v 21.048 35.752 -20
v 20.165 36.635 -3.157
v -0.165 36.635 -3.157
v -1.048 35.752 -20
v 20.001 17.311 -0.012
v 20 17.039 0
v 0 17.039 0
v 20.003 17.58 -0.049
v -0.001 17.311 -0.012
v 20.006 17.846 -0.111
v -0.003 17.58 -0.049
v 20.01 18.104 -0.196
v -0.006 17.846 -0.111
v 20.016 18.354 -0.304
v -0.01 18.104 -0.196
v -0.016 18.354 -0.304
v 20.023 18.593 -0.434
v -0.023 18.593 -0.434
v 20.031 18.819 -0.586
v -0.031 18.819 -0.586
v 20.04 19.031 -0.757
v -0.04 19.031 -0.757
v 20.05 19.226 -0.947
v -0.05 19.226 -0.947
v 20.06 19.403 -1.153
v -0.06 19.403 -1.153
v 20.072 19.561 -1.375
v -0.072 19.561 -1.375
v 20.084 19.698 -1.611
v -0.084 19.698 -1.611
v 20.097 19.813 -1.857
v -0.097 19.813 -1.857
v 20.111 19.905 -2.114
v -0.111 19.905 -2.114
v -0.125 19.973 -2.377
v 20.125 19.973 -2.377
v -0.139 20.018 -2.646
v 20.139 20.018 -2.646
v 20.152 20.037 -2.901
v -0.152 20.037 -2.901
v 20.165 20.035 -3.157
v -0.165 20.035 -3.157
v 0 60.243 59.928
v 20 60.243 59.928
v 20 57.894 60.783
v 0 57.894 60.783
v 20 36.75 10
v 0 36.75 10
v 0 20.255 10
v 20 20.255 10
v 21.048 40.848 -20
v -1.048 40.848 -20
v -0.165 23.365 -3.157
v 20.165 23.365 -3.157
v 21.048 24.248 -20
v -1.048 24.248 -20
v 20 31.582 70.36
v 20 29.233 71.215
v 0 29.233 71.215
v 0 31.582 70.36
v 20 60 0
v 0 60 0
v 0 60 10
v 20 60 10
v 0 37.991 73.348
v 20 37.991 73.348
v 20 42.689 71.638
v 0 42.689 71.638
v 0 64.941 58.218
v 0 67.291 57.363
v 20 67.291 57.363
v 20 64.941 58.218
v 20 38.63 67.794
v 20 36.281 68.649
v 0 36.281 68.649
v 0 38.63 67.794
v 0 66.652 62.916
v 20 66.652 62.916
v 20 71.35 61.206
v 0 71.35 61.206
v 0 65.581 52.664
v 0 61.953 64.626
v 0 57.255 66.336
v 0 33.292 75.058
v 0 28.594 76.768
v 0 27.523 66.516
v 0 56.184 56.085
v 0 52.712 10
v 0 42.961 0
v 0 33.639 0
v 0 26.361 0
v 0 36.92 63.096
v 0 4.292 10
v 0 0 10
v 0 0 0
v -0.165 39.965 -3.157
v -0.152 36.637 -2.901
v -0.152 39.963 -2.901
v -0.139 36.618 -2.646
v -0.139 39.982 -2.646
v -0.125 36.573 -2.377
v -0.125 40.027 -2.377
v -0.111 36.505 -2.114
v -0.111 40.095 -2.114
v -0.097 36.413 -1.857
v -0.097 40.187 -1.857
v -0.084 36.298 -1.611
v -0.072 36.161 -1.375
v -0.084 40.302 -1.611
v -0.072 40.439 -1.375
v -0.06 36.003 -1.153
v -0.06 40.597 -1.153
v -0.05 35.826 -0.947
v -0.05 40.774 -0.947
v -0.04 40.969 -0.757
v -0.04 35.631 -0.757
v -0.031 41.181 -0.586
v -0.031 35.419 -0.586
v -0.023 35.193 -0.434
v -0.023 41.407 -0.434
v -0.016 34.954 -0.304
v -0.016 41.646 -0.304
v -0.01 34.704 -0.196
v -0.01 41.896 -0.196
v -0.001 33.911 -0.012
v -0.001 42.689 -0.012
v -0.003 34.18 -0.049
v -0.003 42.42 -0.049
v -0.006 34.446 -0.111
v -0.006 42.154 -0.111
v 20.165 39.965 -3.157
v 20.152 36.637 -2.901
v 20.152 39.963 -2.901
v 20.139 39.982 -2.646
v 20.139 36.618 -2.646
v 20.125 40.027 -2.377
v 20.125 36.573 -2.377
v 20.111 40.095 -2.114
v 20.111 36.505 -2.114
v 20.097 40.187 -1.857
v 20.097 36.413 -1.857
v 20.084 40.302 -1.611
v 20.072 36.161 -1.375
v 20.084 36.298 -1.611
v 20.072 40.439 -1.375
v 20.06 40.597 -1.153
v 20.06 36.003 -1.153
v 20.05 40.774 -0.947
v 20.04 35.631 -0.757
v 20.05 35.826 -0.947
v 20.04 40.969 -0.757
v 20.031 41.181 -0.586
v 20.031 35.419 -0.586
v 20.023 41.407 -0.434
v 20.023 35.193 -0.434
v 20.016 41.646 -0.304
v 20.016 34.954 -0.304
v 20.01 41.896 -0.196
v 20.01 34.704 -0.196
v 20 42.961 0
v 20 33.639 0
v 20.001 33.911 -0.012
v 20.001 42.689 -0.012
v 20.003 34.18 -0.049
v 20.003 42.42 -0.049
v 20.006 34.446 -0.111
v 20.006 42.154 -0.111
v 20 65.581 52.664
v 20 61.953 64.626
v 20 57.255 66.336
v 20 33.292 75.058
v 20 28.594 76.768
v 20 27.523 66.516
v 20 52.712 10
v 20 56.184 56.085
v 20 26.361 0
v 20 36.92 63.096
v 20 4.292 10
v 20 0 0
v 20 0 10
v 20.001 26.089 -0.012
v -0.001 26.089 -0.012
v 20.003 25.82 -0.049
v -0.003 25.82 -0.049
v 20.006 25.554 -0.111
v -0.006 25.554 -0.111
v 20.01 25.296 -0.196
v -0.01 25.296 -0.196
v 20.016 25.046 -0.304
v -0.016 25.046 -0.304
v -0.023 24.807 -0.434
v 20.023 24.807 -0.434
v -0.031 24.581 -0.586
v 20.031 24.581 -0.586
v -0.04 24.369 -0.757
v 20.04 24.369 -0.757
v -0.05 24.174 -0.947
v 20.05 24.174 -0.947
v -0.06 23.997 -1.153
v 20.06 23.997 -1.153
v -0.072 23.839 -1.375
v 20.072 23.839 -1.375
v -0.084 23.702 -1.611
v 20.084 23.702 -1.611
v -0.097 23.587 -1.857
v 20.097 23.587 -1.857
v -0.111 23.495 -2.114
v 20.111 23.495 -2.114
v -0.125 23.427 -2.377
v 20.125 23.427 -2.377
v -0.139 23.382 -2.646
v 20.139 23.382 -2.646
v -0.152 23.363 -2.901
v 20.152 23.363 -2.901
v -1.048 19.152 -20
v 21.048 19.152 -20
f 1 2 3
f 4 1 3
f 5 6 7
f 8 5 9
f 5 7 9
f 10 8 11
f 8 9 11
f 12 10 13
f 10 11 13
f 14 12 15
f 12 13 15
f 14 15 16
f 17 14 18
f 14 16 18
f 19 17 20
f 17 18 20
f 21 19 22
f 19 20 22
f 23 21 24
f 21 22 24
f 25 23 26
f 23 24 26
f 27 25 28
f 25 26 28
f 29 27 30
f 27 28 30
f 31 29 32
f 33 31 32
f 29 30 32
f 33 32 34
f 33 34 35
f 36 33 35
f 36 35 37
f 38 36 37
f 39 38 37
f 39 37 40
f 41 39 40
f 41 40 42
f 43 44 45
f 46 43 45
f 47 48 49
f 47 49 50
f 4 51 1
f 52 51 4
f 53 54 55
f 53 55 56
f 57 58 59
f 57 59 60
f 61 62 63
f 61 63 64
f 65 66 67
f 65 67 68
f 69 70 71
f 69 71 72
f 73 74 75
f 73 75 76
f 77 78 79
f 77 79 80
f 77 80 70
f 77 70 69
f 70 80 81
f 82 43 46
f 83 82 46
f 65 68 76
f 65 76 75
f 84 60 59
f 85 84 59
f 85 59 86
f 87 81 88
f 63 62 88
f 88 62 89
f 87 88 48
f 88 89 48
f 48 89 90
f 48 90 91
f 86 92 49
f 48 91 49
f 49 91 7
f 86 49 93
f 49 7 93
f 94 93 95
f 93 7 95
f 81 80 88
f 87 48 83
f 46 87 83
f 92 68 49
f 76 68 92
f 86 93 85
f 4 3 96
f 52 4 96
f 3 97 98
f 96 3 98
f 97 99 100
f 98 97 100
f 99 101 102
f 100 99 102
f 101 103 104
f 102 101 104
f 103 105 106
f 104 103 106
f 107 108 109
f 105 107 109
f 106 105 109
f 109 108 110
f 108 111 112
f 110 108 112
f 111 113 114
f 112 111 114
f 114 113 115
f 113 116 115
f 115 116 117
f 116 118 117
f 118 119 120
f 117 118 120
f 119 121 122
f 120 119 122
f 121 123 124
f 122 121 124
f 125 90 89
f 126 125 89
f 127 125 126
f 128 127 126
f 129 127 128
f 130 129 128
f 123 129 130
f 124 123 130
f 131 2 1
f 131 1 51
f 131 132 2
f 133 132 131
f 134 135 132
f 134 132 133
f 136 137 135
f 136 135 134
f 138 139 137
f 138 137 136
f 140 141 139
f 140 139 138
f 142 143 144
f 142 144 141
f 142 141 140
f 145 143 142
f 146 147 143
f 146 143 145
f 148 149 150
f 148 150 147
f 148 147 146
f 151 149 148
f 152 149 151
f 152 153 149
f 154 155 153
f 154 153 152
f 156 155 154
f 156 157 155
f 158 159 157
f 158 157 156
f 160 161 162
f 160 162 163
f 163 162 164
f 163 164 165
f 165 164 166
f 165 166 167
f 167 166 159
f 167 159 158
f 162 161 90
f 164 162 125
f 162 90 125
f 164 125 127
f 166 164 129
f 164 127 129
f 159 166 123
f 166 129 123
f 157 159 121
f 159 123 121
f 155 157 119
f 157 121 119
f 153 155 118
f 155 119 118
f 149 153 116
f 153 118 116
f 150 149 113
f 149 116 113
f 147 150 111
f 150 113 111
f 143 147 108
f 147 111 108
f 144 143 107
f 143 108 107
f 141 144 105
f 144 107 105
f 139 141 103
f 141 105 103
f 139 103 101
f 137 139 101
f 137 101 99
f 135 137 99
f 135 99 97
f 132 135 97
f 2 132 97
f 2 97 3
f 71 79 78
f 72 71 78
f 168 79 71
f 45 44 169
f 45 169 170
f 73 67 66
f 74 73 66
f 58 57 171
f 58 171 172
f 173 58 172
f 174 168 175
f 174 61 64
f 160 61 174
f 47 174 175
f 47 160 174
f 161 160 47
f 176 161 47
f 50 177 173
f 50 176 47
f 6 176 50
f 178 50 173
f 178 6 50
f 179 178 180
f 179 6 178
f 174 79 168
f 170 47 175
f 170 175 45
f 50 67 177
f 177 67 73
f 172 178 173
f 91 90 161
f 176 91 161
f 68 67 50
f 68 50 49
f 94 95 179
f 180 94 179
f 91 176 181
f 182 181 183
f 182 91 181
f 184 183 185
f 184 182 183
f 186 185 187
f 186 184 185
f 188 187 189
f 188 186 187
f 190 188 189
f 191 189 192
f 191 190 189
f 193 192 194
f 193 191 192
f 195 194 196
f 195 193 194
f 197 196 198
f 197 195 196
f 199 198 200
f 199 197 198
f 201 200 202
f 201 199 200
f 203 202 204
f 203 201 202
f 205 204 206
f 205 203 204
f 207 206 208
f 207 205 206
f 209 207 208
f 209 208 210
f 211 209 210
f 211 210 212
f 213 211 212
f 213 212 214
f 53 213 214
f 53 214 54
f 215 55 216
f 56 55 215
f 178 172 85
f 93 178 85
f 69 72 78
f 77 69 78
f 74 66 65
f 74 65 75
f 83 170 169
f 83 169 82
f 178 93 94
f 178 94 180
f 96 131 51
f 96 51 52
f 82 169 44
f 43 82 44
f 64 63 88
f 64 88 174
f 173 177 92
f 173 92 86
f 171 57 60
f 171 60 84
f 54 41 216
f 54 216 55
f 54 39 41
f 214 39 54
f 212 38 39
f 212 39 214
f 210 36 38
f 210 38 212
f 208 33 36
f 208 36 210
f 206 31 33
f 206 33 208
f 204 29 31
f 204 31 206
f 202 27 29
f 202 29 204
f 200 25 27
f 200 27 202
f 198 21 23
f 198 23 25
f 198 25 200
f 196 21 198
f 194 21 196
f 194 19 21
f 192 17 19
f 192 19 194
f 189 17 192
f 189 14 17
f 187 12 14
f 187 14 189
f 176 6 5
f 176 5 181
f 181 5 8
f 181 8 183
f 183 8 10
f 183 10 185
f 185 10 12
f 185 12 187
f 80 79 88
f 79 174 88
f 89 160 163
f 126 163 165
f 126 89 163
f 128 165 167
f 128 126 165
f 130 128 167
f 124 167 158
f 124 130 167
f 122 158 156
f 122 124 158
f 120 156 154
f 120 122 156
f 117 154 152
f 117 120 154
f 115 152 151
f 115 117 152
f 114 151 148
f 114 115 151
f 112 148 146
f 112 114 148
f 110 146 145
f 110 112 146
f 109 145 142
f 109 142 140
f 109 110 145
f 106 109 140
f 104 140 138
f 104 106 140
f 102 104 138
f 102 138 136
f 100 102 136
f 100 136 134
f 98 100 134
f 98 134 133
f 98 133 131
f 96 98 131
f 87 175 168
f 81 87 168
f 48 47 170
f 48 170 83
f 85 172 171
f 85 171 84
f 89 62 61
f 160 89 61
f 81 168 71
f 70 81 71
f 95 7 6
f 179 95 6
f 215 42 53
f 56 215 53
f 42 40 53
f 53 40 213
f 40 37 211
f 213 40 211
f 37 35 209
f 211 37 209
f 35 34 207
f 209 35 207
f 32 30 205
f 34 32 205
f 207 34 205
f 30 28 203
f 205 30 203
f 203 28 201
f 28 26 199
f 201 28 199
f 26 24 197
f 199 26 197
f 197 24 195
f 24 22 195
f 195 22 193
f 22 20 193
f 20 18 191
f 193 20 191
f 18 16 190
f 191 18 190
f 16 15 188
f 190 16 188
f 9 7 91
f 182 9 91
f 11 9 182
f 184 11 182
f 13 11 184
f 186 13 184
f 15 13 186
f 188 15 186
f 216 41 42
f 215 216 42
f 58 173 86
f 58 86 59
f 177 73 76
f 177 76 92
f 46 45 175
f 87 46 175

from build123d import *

# Parameters (mm, degrees)
SKETCH1_W                       = 20
SKETCH1_H                       = 60
BOSS_EXTRUDE1_DEPTH             = 10
SKETCH3_W                       = 20
SKETCH3_H                       = 3
BOSS_EXTRUDE2_DEPTH             = 20
BOSS_EXTRUDE2_DRAFT             = -3
BOSS_EXTRUDE2_PROFILE_2_DEPTH   = 20
BOSS_EXTRUDE2_PROFILE_2_DRAFT   = -3
FILLET1_R                       = 3
SKETCH7_W                       = 20
SKETCH7_H                       = 15
BOSS_EXTRUDE3_DEPTH             = 52
BOSS_EXTRUDE3_DIRECTION_2_REACH = 74.352
BOSS_EXTRUDE4_REACH             = 74.712
SKETCH11_W                      = 20
SKETCH11_H                      = 15
BOSS_EXTRUDE4_DIRECTION_2_DEPTH = 52
CUT_EXTRUDE2_START              = -20
CUT_EXTRUDE2_DEPTH              = 127.898033865


with BuildPart() as part:
    # Sketch1 → Boss-Extrude1 (new body)
    with BuildSketch(Plane.XY):
        with Locations((10, 30)):
            Rectangle(SKETCH1_W, SKETCH1_H)
    extrude(amount=BOSS_EXTRUDE1_DEPTH)


with BuildPart() as boss_extrude2_tool:
    # Sketch3 → Boss-Extrude2 (with draft: the straight prism first)
    with BuildSketch(Plane(origin=(0, 0, 0), x_dir=(-1, 0, 0), z_dir=(0, 0, -1))):
        with Locations((-10, 38.3)):
            Rectangle(SKETCH3_W, SKETCH3_H)
    extrude(amount=BOSS_EXTRUDE2_DEPTH)
    # Boss-Extrude2: the draft: its side faces are tilted about the plane it starts from
    boss_extrude2_sides = [boss_extrude2_tool.faces().sort_by_distance(p)[0] for p in [
        (20, 38.3, -10),
        (10, 36.8, -10),
        (0, 38.3, -10),
        (10, 39.8, -10),
    ]]
    draft(boss_extrude2_sides, Plane(origin=(0, 0, 0), x_dir=(-1, 0, 0), z_dir=(0, 0, -1)), BOSS_EXTRUDE2_DRAFT)


with BuildPart() as part_1:
    add(part.part)

    # Boss-Extrude2: add boss_extrude2_tool
    add(boss_extrude2_tool.part)


with BuildPart() as boss_extrude2_profile_2_tool:
    # Sketch3 → Boss-Extrude2 profile 2 (with draft: the straight prism first)
    with BuildSketch(Plane(origin=(0, 0, 0), x_dir=(-1, 0, 0), z_dir=(0, 0, -1))):
        with Locations((-10, 21.7)):
            Rectangle(SKETCH3_W, SKETCH3_H)
    extrude(amount=BOSS_EXTRUDE2_PROFILE_2_DEPTH)
    # Boss-Extrude2 profile 2: the draft: its side faces are tilted about the plane it starts from
    boss_extrude2_profile_2_sides = [boss_extrude2_profile_2_tool.faces().sort_by_distance(p)[0] for p in [
        (20, 21.7, -10),
        (10, 20.2, -10),
        (0, 21.7, -10),
        (10, 23.2, -10),
    ]]
    draft(boss_extrude2_profile_2_sides, Plane(origin=(0, 0, 0), x_dir=(-1, 0, 0), z_dir=(0, 0, -1)), BOSS_EXTRUDE2_PROFILE_2_DRAFT)


with BuildPart() as part_2:
    add(part_1.part)

    # Boss-Extrude2 profile 2: add boss_extrude2_profile_2_tool
    add(boss_extrude2_profile_2_tool.part)

    # Fillet1
    fillet1_edges = [part_2.edges().sort_by_distance(p)[0] for p in [
        (10, 36.8, 0),
        (10, 39.8, 0),
        (10, 20.2, 0),
        (10, 23.2, 0),
    ]]
    fillet(fillet1_edges, radius=FILLET1_R)

    # Sketch7 → Boss-Extrude3 (add)
    with BuildSketch(Plane(origin=(0, 10.232604755, 28.113850506), x_dir=(-1, 0, 0), z_dir=(0, 0.34202014332566943, 0.9396926207859081))):
        with Locations((-10, -8.113337756)):
            Rectangle(SKETCH7_W, SKETCH7_H)
    extrude(amount=BOSS_EXTRUDE3_DEPTH)

    # Boss-Extrude3 direction 2: up to this face of the body (flat: up to its plane)
    boss_extrude3_direction_2_end = Plane(part_2.part.faces().sort_by_distance((10, 30, 10))[0])
    # Sketch7 → Boss-Extrude3 direction 2 (add, up to the picked face)
    with BuildSketch(Plane(origin=(0, 10.232604755, 28.113850506), x_dir=(-1, 0, 0), z_dir=(0, 0.34202014332566943, 0.9396926207859081)), mode=Mode.PRIVATE) as boss_extrude3_direction_2_sk1:
        with Locations((-10, -8.113337756)):
            Rectangle(SKETCH7_W, SKETCH7_H)
    boss_extrude3_direction_2_tool1 = split(extrude(boss_extrude3_direction_2_sk1.sketch, amount=-BOSS_EXTRUDE3_DIRECTION_2_REACH, mode=Mode.PRIVATE), bisect_by=boss_extrude3_direction_2_end, keep=Keep.BOTH, mode=Mode.PRIVATE)
    add(boss_extrude3_direction_2_tool1.solids().sort_by(Axis((10, 17.856648, 25.338926), (0, -0.34202014332566943, -0.9396926207859081)))[0])

    # Boss-Extrude4: up to this plane
    boss_extrude4_end = Plane(origin=(0, 0, 10), z_dir=(0, 0, -1))
    # Sketch11 → Boss-Extrude4 (add, up to the surface)
    with BuildSketch(Plane(origin=(0, 10.232604755, 28.113850506), x_dir=(-1, 0, 0), z_dir=(0, 0.34202014332566943, 0.9396926207859081)), mode=Mode.PRIVATE) as boss_extrude4_sk1:
        with Locations((-10, -38.613337756)):
            Rectangle(SKETCH11_W, SKETCH11_H)
    boss_extrude4_tool1 = split(extrude(boss_extrude4_sk1.sketch, amount=-BOSS_EXTRUDE4_REACH, mode=Mode.PRIVATE), bisect_by=boss_extrude4_end, keep=Keep.BOTH, mode=Mode.PRIVATE)
    add(boss_extrude4_tool1.solids().sort_by_distance((10, 46.517273, 14.907311))[0])

    # Sketch11 → Boss-Extrude4 direction 2 (add)
    with BuildSketch(Plane(origin=(0, 10.232604755, 28.113850506), x_dir=(-1, 0, 0), z_dir=(0, 0.34202014332566943, 0.9396926207859081))):
        with Locations((-10, -38.613337756)):
            Rectangle(SKETCH11_W, SKETCH11_H)
    extrude(amount=BOSS_EXTRUDE4_DIRECTION_2_DEPTH)

    # Sketch9 → Cut-Extrude2 (cut)
    with BuildSketch(Plane.ZY.offset(CUT_EXTRUDE2_START)):
        Polygon((275.181377297, 111.452308492), (73.347891487, 37.990927379), (68.649428383, 36.280826662), (67.794378024, 38.630058214), (63.09591492, 36.919957498), (66.516116354, 27.52303129), (71.214579458, 29.233132007), (70.359529099, 31.582363559), (75.057992203, 33.292464275), (276.891478013, 106.753845388), (680.558449633, 253.676607614), (678.848348917, 258.375070718), align=None)
    cut_extrude2 = extrude(amount=CUT_EXTRUDE2_DEPTH, mode=Mode.SUBTRACT)

    # Mirror1: Cut-Extrude2 across plane
    add(cut_extrude2.mirror(Plane(origin=(0, 21.954356086, -7.990732128), x_dir=(0, 0.3420201433256692, 0.9396926207859082), z_dir=(0, -0.9396926207859083, 0.3420201433256692))), mode=Mode.SUBTRACT)


solid = part_2.part
